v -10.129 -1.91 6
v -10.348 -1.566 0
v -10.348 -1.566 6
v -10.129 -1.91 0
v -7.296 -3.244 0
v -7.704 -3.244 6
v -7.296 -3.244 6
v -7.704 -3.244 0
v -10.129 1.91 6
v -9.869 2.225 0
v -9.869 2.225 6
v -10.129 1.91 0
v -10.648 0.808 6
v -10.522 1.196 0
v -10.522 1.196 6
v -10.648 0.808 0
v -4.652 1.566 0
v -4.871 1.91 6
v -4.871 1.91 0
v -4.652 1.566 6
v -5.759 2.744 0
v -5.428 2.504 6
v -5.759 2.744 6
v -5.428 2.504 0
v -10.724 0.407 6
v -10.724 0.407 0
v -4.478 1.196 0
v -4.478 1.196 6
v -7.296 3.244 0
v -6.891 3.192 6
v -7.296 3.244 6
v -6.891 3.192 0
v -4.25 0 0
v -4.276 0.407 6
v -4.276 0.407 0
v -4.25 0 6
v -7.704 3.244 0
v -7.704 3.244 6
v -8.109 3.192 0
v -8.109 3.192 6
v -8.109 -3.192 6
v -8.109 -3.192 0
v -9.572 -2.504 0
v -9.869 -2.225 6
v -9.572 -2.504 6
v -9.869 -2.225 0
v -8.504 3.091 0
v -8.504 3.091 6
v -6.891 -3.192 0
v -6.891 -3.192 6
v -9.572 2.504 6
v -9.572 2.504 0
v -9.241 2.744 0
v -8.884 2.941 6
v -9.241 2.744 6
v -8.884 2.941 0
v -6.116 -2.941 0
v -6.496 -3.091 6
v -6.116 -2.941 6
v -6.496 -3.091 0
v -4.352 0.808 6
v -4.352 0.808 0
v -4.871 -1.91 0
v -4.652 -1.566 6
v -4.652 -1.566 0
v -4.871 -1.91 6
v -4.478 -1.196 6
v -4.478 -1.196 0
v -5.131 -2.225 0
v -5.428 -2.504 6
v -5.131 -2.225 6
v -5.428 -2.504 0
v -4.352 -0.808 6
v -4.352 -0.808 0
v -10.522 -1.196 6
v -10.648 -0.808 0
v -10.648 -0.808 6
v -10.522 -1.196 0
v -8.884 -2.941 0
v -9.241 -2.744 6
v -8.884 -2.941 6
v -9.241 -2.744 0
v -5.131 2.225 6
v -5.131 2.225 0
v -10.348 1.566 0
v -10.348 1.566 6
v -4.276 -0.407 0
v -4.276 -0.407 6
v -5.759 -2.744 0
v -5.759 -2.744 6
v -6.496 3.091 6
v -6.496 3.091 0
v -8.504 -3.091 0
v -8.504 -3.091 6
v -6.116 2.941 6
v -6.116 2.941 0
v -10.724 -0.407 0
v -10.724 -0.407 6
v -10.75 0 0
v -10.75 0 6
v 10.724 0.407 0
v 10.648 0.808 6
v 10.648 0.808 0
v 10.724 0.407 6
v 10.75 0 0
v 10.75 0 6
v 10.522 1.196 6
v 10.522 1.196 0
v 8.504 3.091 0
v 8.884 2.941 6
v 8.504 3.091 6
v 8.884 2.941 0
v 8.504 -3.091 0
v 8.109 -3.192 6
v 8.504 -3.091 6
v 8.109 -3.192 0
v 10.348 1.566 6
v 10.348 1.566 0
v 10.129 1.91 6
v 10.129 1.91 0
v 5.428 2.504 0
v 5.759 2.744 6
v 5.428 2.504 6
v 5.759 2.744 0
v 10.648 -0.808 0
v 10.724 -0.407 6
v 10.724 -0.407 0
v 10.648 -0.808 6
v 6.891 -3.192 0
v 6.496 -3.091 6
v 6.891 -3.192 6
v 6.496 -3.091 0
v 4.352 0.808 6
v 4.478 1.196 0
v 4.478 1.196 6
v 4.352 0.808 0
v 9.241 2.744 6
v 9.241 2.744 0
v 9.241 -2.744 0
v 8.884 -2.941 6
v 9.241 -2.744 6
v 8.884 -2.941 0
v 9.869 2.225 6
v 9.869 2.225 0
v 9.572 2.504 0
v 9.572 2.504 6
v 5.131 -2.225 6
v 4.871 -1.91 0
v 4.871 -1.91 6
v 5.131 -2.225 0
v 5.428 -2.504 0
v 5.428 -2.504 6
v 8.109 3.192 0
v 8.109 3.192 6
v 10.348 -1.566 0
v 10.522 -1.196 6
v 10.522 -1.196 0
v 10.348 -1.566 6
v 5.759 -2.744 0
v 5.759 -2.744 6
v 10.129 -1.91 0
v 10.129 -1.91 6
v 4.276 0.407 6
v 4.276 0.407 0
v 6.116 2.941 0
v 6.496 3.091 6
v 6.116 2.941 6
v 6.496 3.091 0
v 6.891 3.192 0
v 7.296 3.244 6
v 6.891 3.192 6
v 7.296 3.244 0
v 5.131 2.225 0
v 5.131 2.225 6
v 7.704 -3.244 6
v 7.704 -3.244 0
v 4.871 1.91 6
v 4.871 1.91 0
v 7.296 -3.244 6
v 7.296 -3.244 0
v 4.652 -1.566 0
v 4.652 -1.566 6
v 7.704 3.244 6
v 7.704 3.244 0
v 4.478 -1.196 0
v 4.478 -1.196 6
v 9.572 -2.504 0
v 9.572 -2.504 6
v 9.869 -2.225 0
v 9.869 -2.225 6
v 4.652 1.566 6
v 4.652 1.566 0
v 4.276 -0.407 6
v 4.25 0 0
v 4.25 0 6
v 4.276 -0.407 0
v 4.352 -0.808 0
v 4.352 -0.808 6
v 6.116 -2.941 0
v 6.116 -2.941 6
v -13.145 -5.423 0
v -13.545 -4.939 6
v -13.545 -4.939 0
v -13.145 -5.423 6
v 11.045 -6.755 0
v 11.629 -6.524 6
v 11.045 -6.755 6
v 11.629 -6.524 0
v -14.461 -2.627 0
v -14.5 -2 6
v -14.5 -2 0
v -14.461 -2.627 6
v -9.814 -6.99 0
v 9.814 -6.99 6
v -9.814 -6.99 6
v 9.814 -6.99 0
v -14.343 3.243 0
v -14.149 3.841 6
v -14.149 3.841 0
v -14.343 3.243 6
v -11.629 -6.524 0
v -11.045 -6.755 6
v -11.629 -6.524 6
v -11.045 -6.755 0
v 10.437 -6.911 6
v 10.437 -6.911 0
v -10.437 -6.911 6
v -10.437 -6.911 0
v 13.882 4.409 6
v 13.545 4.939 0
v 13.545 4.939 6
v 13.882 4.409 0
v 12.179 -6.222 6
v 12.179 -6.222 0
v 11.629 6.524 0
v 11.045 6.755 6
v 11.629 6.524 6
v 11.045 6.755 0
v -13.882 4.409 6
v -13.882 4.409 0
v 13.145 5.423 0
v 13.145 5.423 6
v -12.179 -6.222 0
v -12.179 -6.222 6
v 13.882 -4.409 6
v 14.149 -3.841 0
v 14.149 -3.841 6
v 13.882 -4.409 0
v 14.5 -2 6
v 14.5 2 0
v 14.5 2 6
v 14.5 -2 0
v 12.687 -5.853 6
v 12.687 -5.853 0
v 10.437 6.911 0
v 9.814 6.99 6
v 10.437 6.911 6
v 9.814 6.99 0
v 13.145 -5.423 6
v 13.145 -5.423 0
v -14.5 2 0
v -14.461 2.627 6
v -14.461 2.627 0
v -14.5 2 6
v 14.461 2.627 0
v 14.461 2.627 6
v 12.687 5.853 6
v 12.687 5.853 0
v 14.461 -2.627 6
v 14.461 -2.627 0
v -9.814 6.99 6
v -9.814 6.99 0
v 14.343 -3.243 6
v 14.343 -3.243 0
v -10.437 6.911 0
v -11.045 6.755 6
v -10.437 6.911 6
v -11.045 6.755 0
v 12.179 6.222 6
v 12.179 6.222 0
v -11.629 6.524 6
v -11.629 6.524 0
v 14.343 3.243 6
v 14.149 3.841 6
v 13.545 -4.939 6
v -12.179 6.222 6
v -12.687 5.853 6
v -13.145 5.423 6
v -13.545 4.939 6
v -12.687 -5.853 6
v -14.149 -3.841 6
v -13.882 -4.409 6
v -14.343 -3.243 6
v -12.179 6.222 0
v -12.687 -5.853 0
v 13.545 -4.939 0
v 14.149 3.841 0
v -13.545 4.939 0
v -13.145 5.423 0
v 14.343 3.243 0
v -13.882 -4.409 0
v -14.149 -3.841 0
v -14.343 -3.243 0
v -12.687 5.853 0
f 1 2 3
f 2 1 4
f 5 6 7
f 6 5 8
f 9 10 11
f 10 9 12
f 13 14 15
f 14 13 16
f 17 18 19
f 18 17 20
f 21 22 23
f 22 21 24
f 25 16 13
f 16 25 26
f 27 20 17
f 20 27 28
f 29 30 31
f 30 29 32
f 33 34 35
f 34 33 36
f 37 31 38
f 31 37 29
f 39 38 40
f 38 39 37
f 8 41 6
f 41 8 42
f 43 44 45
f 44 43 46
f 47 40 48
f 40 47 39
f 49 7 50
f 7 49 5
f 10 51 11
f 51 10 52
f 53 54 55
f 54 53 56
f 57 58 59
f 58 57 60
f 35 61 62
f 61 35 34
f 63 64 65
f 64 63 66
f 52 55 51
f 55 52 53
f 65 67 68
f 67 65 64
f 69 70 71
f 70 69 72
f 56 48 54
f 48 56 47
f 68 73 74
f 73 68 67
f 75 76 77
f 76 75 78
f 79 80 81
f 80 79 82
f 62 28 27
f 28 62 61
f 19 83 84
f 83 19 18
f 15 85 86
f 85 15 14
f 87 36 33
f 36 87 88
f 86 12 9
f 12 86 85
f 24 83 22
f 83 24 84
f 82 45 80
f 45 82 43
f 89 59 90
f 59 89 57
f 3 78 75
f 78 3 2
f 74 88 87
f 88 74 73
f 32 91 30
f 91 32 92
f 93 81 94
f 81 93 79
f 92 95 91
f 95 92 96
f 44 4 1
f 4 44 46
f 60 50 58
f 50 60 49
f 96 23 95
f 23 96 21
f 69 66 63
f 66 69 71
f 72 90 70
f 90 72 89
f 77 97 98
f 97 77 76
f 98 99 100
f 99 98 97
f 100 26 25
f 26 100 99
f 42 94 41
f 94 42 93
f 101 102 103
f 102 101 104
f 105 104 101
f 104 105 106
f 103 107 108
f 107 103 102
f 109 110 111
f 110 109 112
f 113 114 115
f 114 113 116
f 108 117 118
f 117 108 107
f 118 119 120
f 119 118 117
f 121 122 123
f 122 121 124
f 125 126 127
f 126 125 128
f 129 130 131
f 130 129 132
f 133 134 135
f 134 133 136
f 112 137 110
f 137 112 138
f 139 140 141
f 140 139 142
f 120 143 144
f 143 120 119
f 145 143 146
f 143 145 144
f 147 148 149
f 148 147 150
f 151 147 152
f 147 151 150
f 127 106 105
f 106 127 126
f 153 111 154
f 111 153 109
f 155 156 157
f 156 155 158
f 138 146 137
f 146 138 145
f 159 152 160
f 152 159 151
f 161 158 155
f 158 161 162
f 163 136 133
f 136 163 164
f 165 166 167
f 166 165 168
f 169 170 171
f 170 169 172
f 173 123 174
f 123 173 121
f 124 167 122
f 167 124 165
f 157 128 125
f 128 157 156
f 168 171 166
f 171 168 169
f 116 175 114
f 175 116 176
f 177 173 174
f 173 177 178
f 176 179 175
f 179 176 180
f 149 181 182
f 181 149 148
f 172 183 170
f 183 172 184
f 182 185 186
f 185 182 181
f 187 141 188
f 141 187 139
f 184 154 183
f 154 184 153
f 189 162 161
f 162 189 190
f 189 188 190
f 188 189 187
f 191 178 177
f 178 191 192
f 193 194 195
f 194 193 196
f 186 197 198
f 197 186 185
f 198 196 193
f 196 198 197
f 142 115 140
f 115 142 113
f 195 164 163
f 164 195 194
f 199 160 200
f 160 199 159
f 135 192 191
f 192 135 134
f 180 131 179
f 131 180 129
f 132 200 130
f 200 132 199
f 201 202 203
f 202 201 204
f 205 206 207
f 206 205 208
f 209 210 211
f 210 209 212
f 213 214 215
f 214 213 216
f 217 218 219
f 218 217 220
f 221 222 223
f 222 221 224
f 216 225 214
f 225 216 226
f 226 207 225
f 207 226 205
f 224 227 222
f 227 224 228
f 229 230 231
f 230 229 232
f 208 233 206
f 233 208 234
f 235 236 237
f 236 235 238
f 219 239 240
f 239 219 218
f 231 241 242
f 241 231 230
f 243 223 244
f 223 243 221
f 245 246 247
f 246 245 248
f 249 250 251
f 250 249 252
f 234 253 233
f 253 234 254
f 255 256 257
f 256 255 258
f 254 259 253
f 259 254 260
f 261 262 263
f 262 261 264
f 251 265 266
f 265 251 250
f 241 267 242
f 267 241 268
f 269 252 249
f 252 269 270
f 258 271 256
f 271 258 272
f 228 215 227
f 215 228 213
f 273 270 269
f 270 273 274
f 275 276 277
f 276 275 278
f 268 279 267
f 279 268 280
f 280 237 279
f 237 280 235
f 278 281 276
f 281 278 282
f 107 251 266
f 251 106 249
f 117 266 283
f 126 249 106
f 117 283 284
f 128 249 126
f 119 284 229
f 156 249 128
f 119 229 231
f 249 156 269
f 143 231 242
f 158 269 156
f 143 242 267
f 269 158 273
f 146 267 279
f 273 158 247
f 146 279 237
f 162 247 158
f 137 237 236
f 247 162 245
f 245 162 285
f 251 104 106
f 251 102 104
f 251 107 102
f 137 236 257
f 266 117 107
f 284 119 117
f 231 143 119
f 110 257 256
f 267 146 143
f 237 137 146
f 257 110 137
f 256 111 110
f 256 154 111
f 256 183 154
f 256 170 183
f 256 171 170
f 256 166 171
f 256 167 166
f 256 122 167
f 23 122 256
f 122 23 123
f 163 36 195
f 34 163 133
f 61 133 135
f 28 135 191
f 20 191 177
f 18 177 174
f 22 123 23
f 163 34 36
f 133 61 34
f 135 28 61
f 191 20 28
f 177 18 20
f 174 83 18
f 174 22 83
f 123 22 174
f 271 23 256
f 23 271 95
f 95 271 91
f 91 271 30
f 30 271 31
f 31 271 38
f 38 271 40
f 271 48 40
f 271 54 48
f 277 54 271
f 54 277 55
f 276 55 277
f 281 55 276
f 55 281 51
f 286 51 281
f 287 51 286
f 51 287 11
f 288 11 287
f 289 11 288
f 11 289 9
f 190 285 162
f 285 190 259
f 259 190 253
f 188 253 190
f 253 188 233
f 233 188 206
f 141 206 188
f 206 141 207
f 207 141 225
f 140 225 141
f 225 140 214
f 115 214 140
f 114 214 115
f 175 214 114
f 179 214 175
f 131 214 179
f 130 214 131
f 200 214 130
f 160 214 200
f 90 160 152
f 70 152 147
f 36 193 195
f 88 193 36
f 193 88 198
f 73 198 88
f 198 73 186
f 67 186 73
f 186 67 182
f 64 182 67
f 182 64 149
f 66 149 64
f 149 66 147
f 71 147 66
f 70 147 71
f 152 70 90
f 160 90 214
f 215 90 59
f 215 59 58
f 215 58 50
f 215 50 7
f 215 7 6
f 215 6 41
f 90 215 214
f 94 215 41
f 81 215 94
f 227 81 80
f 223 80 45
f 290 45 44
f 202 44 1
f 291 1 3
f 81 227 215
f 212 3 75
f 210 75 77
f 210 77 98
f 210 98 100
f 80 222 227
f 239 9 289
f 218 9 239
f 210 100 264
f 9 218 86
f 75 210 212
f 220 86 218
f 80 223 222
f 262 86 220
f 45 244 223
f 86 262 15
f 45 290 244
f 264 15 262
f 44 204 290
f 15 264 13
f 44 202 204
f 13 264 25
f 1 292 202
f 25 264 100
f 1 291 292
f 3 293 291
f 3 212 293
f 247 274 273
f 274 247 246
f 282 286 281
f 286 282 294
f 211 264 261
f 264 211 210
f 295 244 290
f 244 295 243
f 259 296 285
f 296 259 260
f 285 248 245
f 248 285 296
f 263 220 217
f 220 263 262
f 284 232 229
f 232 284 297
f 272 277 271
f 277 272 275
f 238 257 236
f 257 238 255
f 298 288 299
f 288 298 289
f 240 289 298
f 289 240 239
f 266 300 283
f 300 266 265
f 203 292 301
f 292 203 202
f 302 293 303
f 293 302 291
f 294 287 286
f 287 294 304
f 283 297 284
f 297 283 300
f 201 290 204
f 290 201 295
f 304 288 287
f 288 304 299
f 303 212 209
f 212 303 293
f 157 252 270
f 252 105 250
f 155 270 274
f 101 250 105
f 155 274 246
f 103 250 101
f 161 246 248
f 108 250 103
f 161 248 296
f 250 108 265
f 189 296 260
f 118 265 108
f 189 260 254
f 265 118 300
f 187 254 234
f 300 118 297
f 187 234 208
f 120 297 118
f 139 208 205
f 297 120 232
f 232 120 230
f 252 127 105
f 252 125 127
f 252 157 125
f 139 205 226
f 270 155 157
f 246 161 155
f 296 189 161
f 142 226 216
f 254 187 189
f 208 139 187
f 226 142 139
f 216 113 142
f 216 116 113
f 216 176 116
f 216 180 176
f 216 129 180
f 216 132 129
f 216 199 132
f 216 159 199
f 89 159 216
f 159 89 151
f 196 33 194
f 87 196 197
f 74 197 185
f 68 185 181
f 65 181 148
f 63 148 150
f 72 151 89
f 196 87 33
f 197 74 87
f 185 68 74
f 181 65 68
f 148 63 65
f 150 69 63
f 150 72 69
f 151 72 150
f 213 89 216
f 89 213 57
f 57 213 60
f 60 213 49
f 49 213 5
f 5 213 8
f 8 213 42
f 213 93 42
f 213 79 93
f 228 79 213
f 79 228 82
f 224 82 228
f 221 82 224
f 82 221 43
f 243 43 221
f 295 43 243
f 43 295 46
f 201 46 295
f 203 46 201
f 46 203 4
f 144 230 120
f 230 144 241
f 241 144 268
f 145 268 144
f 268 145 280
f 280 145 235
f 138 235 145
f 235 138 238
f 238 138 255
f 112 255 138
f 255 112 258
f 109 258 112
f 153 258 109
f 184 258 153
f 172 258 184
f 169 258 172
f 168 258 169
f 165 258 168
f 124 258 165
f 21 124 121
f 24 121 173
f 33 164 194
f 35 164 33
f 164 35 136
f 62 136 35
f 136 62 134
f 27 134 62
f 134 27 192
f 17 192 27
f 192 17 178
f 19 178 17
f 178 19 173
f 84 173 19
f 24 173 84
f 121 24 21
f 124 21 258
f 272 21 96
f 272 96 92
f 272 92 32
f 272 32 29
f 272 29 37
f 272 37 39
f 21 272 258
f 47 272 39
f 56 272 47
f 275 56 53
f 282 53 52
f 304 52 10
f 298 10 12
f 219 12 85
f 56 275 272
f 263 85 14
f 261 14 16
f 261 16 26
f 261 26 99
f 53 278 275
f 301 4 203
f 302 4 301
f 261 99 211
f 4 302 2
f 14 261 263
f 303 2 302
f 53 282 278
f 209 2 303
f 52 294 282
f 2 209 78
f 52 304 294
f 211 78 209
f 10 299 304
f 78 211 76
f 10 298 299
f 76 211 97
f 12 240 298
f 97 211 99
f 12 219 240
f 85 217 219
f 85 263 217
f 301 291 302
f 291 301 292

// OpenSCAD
$fn = 50;


difference() {
	union() {
		hull() {
			translate(v = [-9.5000000000, 2.0000000000, 0]) {
				cylinder(h = 6, r = 5);
			}
			translate(v = [9.5000000000, 2.0000000000, 0]) {
				cylinder(h = 6, r = 5);
			}
			translate(v = [-9.5000000000, -2.0000000000, 0]) {
				cylinder(h = 6, r = 5);
			}
			translate(v = [9.5000000000, -2.0000000000, 0]) {
				cylinder(h = 6, r = 5);
			}
		}
	}
	union() {
		translate(v = [-7.5000000000, 0.0000000000, 0]) {
			translate(v = [0, 0, -100]) {
				cylinder(h = 200, r = 3.2500000000);
			}
		}
		translate(v = [7.5000000000, 0.0000000000, 0]) {
			translate(v = [0, 0, -100]) {
				cylinder(h = 200, r = 3.2500000000);
			}
		}
	}
}
